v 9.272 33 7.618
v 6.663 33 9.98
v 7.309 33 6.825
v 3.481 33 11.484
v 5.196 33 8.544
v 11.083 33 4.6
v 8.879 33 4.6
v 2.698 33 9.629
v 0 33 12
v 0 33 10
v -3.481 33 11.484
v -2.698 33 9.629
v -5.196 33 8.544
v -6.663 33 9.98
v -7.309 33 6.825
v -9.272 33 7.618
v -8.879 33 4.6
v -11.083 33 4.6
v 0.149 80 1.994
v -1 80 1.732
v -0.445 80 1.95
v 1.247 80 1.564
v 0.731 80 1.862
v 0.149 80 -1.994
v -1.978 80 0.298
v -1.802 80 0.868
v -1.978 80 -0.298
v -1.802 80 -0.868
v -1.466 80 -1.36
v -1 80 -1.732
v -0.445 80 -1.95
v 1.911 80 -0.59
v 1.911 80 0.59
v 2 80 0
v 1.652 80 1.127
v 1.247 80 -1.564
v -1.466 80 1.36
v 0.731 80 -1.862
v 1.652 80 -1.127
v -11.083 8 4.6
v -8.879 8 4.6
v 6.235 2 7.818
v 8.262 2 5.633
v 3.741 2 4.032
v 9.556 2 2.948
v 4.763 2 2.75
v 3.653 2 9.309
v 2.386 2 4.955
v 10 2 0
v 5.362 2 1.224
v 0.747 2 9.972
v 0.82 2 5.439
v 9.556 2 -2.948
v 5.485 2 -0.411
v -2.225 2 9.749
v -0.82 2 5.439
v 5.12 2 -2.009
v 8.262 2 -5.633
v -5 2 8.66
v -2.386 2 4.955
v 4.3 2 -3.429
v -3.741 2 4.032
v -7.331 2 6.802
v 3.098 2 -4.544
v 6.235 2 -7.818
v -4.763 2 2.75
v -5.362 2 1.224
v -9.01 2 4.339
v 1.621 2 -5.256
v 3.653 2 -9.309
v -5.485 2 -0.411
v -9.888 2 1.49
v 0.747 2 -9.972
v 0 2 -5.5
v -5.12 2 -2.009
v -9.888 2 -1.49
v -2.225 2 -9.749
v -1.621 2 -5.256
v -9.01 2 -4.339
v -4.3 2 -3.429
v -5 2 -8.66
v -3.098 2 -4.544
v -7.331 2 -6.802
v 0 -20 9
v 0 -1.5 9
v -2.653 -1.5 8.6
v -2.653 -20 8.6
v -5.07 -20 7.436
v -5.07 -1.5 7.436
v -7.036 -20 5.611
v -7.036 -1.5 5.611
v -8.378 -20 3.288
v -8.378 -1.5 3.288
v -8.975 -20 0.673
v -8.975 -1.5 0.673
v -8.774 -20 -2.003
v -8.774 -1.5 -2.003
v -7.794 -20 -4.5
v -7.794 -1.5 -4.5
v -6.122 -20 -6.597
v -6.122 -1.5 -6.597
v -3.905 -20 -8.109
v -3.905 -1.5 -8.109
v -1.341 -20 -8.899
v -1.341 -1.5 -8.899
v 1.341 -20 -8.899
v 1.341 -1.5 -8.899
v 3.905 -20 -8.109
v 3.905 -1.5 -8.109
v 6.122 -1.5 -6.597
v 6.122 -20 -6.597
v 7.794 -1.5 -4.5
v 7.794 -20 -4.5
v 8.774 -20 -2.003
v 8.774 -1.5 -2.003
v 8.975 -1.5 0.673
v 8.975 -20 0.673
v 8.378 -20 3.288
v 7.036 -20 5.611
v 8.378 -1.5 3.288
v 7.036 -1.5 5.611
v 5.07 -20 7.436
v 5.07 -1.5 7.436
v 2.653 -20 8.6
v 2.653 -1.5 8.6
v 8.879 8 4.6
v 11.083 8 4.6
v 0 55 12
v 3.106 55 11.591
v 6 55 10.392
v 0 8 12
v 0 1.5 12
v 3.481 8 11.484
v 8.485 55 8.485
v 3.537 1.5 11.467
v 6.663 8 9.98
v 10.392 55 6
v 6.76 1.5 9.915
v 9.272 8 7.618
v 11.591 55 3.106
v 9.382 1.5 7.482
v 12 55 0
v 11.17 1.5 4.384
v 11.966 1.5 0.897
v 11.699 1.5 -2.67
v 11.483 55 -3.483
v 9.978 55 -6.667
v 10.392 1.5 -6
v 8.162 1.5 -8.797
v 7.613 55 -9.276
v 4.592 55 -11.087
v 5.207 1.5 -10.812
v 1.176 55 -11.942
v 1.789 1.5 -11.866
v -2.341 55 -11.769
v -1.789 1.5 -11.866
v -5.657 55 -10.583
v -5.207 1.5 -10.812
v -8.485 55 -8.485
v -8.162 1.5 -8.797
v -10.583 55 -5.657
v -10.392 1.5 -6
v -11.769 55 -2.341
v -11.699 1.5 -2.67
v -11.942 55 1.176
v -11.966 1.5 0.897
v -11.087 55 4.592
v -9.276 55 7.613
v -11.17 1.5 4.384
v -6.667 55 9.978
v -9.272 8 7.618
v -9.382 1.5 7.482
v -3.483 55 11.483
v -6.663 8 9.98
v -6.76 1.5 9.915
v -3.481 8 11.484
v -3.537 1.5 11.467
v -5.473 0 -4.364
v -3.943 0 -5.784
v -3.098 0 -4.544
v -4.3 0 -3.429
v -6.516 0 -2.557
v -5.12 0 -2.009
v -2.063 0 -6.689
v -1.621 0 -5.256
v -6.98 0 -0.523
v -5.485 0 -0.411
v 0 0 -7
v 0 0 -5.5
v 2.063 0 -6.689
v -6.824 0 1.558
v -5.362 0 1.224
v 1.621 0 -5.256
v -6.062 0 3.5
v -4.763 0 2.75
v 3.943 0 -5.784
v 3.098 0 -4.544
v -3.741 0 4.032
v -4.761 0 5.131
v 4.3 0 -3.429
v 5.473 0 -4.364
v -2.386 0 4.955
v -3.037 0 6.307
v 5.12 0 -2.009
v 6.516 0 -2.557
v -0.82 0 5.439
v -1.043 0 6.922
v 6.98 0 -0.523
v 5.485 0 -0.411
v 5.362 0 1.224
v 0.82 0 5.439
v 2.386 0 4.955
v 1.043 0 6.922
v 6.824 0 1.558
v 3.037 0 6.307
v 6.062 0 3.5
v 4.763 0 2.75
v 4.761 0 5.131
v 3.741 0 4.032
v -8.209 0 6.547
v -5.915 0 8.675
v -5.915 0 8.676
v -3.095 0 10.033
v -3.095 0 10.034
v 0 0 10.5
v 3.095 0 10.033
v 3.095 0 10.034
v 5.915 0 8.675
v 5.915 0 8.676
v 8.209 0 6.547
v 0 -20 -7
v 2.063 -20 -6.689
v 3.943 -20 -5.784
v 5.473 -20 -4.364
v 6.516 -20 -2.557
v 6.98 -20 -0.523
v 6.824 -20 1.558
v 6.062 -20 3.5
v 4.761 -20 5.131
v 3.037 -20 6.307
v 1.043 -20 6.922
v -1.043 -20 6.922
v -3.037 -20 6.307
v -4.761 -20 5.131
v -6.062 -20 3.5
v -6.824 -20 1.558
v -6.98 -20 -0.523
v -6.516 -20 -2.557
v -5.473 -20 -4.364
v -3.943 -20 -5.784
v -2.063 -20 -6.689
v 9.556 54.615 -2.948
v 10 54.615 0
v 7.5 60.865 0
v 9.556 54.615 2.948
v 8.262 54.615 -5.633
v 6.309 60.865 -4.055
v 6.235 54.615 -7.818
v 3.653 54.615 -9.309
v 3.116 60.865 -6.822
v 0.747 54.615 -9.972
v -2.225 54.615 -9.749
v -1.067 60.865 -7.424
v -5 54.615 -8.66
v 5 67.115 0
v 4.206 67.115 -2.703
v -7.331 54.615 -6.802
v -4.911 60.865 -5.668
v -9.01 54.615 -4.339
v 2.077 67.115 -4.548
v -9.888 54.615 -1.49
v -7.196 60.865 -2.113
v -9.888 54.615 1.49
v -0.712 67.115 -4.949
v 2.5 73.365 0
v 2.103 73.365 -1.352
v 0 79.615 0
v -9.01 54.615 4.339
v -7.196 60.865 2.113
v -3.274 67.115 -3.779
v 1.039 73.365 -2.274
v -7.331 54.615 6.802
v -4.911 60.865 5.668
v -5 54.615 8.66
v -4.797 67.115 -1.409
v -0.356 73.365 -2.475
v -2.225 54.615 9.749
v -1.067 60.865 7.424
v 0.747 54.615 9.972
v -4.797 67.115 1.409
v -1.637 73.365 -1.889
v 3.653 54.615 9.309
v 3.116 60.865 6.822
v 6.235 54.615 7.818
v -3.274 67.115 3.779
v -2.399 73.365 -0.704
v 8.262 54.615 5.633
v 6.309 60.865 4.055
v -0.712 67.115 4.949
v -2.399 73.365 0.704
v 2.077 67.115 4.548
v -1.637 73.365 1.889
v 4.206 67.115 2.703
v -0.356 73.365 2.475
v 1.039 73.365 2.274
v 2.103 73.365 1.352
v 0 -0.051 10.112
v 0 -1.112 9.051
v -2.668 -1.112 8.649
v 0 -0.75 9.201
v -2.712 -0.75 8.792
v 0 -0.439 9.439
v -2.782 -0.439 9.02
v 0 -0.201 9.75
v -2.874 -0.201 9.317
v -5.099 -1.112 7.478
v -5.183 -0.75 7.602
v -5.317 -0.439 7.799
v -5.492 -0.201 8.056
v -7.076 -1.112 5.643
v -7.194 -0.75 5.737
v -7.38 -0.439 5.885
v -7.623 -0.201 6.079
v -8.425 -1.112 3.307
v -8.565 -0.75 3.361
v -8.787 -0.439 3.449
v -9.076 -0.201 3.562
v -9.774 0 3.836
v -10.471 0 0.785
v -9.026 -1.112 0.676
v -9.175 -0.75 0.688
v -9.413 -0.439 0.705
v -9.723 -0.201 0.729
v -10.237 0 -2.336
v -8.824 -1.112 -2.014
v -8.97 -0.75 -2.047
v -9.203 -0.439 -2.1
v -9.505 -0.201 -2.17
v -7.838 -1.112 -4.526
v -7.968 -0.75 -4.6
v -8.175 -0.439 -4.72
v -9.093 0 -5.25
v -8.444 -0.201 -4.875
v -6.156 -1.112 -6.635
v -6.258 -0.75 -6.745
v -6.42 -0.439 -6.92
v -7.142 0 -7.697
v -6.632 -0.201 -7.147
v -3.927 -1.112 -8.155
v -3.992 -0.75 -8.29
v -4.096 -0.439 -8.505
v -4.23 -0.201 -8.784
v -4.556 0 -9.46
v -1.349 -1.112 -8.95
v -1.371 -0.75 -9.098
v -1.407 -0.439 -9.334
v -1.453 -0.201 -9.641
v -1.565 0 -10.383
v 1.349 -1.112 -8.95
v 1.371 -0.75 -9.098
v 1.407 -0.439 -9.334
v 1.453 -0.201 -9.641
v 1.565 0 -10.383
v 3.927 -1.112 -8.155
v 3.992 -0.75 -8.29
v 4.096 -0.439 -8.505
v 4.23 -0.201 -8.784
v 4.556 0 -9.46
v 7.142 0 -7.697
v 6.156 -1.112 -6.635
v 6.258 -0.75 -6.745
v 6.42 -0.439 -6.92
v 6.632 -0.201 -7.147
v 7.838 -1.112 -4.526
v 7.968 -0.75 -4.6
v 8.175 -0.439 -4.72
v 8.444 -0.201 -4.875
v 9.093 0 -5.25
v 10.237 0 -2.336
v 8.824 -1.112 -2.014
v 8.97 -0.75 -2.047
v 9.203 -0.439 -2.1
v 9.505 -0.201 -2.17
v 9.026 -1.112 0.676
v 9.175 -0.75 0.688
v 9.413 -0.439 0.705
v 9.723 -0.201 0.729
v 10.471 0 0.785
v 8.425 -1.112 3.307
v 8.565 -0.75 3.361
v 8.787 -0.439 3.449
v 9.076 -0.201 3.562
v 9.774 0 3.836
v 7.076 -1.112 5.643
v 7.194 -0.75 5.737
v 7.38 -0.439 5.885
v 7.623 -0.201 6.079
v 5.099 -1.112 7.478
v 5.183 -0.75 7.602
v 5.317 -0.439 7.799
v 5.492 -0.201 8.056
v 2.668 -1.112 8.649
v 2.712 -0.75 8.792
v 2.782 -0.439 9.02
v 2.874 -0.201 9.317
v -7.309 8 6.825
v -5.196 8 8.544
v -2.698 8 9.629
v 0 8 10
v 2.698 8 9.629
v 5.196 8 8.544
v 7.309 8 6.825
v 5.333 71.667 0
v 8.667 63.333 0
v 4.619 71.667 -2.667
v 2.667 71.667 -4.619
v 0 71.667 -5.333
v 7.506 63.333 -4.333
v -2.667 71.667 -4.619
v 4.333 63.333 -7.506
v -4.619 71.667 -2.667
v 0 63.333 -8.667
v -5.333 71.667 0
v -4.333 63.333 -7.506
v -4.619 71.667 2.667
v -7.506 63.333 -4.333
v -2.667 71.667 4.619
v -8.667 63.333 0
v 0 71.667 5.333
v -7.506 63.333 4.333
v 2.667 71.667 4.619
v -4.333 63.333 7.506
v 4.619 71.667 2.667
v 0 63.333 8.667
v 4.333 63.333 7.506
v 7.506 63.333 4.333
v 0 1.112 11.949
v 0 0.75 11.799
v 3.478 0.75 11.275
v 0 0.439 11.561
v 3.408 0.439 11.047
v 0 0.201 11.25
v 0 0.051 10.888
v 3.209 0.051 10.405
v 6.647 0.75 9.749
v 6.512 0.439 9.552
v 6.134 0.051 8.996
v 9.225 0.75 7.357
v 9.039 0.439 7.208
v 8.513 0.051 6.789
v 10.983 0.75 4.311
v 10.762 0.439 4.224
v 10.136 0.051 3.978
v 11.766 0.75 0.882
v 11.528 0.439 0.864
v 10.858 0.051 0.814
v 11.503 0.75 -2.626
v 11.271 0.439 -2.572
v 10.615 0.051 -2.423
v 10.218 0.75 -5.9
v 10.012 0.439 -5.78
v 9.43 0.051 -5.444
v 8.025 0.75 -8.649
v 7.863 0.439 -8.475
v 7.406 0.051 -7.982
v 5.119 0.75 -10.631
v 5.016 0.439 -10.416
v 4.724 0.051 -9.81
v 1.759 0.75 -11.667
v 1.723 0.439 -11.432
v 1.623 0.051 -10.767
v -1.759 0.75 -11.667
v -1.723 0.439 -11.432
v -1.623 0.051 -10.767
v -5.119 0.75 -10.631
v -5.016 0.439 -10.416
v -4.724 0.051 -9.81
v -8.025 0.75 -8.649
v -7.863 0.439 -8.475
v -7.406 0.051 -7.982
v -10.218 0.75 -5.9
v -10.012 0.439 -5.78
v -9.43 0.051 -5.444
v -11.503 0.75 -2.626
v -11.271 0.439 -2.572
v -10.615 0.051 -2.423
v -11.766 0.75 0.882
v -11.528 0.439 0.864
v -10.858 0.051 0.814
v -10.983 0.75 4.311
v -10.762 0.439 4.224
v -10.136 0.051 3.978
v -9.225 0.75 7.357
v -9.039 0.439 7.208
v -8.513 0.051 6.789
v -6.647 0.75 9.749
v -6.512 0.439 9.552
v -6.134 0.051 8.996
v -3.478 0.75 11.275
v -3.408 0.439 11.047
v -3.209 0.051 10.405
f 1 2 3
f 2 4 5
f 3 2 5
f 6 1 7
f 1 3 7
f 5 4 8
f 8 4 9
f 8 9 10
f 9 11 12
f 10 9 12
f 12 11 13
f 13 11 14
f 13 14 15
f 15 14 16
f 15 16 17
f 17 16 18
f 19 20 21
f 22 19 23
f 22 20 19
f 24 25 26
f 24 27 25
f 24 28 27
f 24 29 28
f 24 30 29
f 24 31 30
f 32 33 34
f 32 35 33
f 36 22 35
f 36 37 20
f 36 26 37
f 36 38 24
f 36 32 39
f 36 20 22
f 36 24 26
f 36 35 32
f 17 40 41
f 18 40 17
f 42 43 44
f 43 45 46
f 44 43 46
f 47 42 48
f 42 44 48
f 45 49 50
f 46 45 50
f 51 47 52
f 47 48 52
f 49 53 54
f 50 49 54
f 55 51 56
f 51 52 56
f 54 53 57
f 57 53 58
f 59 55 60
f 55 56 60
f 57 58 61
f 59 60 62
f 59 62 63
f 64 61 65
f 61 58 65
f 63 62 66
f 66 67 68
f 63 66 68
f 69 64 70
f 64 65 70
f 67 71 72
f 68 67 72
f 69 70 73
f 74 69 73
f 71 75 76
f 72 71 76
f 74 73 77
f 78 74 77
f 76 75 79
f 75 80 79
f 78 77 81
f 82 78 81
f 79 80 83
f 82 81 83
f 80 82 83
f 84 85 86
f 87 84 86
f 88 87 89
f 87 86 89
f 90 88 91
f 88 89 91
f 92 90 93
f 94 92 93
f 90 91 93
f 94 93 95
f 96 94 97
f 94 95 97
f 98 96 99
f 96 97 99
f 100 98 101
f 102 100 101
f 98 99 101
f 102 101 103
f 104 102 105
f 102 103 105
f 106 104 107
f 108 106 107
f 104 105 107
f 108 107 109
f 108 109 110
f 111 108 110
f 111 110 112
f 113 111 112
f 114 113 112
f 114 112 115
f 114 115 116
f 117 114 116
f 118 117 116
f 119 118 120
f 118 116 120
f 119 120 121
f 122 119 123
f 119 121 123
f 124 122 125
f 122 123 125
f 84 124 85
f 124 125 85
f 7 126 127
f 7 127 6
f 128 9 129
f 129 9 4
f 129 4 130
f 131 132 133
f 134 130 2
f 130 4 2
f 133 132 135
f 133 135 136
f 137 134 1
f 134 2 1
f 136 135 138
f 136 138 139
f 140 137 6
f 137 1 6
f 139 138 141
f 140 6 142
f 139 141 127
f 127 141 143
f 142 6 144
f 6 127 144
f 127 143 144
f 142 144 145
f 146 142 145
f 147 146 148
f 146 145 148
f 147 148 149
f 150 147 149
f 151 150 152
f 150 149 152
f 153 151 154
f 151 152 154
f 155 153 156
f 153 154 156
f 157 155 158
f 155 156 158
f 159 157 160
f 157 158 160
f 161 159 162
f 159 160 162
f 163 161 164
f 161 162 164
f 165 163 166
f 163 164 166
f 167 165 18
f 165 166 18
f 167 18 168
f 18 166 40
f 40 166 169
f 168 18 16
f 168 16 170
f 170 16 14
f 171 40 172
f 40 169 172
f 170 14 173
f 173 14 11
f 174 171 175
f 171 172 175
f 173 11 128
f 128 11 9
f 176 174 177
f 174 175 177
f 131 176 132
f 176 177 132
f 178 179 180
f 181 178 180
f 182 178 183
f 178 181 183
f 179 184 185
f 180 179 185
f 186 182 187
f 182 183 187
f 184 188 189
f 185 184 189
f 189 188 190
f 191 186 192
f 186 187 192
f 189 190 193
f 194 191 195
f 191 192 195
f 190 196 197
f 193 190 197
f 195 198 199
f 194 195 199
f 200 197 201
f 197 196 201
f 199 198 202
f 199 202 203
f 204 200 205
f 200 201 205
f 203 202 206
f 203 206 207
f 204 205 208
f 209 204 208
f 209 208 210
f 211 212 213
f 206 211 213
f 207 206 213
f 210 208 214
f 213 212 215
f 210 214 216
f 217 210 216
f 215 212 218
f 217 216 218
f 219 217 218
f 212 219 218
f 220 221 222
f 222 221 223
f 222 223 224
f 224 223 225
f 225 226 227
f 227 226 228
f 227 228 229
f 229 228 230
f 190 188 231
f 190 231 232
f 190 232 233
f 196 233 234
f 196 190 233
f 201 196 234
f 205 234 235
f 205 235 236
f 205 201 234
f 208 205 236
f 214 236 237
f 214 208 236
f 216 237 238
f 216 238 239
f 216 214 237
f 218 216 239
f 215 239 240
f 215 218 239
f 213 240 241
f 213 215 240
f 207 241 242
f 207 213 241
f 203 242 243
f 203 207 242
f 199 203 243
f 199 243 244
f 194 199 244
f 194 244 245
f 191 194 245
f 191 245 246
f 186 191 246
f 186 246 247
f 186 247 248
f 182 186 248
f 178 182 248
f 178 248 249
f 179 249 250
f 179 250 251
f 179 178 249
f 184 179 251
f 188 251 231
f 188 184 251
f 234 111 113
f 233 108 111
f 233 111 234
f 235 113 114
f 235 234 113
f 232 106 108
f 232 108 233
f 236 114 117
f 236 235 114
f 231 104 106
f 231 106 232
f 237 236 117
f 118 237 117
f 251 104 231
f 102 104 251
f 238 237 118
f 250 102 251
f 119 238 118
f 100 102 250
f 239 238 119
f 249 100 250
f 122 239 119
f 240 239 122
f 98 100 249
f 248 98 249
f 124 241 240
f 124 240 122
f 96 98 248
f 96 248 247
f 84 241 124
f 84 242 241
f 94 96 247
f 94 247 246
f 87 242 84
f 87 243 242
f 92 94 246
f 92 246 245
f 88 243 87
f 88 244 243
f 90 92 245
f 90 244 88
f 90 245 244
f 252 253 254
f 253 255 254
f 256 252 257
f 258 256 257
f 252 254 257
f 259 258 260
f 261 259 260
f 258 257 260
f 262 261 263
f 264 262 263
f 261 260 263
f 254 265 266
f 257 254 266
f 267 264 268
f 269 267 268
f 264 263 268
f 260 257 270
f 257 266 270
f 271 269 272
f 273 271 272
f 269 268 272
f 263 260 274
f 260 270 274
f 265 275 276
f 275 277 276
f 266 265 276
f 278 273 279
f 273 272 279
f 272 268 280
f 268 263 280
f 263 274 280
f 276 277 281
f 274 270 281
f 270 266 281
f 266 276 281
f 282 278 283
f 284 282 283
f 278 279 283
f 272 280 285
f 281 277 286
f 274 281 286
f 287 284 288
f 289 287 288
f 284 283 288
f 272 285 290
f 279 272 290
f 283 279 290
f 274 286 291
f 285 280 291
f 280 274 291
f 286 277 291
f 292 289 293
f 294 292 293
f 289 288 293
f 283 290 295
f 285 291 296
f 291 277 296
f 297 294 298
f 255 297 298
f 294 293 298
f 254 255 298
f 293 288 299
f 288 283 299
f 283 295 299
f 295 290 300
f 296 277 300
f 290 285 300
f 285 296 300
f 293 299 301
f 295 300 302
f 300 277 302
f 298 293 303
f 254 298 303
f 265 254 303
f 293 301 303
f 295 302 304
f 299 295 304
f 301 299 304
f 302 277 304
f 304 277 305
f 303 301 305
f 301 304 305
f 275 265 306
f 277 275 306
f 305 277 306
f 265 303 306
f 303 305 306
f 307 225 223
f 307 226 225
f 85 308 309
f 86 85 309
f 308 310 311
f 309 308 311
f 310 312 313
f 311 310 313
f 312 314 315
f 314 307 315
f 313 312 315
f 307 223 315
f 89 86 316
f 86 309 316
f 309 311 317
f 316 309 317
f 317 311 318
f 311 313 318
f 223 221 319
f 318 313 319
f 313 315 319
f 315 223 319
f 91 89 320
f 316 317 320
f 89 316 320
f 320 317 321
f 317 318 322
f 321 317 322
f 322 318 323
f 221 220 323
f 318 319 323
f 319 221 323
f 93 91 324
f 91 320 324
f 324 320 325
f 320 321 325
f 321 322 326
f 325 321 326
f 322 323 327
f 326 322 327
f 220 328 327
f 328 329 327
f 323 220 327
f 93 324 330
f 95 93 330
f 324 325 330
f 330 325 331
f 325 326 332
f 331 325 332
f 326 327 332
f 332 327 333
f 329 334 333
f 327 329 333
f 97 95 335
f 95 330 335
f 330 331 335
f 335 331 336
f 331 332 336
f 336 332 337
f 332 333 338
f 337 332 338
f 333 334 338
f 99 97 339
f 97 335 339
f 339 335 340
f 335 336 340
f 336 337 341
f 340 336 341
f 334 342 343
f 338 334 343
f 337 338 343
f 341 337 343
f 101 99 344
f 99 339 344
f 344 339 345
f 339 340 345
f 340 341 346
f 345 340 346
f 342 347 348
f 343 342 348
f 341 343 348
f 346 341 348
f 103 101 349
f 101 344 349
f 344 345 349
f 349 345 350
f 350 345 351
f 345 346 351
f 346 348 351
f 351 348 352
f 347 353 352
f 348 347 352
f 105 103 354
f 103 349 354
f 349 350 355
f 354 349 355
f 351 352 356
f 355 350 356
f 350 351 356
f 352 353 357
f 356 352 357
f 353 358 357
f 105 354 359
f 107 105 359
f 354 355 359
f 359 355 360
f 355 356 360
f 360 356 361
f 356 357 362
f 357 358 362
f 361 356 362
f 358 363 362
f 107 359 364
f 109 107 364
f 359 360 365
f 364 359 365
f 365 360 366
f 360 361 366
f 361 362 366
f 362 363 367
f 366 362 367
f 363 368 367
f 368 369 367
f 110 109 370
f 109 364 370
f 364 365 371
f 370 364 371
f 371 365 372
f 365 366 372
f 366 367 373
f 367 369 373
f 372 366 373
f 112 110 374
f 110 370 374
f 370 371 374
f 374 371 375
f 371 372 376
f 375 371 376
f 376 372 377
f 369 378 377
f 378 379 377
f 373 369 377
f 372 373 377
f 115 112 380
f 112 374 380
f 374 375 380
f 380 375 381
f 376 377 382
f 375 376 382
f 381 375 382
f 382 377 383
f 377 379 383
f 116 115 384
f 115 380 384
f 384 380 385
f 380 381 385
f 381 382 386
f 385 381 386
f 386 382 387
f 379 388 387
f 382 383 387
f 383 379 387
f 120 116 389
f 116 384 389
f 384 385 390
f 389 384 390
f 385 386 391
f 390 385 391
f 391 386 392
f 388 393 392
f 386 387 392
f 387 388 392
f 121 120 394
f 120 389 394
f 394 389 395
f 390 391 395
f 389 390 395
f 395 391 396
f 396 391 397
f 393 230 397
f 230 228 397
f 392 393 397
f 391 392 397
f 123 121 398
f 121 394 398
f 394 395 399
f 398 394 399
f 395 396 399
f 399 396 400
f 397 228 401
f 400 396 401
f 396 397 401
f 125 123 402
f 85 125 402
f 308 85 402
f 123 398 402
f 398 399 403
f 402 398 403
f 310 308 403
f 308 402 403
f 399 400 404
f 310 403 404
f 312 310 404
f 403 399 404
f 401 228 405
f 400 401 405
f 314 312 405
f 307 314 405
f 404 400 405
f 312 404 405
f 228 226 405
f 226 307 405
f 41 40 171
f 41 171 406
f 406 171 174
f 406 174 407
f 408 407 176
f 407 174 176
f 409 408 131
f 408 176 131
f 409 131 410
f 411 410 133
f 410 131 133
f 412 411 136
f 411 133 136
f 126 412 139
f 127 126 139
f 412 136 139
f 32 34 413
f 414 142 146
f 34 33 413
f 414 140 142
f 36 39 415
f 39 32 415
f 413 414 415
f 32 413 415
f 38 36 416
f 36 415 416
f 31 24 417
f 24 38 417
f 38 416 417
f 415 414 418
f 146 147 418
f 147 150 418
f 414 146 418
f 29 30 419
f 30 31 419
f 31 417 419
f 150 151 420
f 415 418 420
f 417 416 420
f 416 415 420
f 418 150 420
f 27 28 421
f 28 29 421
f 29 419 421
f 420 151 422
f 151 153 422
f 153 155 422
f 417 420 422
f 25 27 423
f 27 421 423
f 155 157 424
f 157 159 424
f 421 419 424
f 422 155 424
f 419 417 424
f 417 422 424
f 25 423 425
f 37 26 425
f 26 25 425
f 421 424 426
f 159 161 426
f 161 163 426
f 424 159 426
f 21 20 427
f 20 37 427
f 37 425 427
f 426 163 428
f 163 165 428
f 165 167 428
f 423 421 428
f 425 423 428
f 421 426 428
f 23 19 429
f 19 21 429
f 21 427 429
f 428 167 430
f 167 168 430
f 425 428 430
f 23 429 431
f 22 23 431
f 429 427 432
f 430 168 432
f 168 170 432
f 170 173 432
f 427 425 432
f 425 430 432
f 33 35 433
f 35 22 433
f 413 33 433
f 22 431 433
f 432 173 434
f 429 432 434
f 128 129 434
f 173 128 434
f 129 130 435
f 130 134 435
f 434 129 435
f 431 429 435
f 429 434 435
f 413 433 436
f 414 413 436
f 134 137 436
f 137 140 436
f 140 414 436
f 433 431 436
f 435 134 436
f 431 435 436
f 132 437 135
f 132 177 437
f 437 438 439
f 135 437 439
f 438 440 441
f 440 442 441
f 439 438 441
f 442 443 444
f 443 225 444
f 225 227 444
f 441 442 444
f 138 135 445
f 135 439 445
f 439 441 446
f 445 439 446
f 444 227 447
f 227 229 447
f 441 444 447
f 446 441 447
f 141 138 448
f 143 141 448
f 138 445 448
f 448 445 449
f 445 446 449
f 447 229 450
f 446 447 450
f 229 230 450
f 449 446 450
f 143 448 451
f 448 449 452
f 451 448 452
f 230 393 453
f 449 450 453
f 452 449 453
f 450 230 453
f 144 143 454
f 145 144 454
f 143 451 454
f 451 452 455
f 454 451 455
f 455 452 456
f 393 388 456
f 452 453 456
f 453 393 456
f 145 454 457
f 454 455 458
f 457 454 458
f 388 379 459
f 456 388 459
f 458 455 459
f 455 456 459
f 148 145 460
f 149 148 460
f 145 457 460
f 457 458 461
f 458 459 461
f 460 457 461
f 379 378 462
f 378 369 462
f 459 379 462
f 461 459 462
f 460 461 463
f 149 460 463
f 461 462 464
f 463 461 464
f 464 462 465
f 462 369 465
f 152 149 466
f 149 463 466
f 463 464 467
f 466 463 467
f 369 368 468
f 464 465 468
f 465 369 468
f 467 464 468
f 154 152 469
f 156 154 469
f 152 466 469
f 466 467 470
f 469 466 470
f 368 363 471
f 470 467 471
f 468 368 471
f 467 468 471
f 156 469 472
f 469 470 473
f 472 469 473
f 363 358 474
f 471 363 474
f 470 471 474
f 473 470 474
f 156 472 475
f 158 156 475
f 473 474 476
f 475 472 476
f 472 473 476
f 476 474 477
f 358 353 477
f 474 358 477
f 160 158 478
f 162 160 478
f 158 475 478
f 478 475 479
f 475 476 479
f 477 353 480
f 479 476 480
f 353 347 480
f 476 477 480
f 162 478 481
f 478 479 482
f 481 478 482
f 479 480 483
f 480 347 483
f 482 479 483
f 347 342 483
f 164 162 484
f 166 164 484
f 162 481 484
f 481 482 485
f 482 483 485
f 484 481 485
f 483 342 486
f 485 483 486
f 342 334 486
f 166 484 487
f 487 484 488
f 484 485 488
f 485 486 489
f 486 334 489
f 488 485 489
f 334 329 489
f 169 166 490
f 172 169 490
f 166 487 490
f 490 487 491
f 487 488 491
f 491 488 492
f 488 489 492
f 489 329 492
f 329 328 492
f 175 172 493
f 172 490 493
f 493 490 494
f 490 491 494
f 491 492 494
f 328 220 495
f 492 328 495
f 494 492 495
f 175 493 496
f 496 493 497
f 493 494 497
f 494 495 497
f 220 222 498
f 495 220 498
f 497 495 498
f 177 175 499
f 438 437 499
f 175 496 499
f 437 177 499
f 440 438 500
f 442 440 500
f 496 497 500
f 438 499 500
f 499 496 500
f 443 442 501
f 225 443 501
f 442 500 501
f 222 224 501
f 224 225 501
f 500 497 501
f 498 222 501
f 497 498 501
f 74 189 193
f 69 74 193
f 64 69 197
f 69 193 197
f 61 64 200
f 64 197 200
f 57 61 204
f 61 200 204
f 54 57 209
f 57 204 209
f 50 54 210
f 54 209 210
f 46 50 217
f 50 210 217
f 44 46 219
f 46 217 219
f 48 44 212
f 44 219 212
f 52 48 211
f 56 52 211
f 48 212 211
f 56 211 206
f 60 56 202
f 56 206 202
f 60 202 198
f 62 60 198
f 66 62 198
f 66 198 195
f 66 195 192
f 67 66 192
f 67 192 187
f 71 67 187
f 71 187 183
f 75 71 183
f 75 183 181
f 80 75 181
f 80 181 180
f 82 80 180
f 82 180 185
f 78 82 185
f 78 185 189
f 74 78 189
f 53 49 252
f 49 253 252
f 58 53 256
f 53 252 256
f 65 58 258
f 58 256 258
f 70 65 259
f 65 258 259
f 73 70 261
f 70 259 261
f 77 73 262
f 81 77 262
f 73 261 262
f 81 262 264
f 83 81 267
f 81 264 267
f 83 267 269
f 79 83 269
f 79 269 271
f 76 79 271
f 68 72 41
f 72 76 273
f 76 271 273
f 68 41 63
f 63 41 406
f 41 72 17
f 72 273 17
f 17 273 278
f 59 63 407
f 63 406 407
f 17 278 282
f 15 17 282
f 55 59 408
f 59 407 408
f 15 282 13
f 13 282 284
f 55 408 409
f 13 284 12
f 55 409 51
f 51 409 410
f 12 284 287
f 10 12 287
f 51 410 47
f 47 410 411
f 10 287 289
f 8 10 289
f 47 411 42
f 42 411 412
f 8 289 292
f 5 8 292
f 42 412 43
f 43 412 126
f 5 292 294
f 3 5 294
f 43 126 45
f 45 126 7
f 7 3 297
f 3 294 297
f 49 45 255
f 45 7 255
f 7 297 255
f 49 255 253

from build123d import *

# Parameters (mm, degrees)
SKETCH1_R               = 12
BOSS_EXTRUDE1_DEPTH     = 55
SKETCH2_R               = 2
SKETCH3_R               = 9
SKETCH3_R_2             = 7
BOSS_EXTRUDE2_DEPTH     = 20
SKETCH5_R               = 5.5
CUT_EXTRUDE2_DEPTH      = 4
SKETCH6_W               = 20
SKETCH6_H               = 25
CUT_EXTRUDE3_DEPTH      = 3
CUT_EXTRUDE4_DEPTH      = 85.380092576
CUT_EXTRUDE4_DEPTH_BACK = 85.380092576
SKETCH7_W               = 7.4
SKETCH7_H               = 25
FILLET1_R               = 1.5


# Read off the part's stored shape, not the designer's step: Shell1
with BuildPart() as part:
    # Sketch1 → Boss-Extrude1 (new body)
    with BuildSketch(Plane(origin=(0, 0, 0), x_dir=(1, 0, 0), z_dir=(0, 1, 0))):
        with Locations(Location((0, 0, 0), (0, 0, 270))):
            Circle(SKETCH1_R)
    extrude(amount=BOSS_EXTRUDE1_DEPTH)

    # Sketch2 → section 0 of loft1
    with BuildSketch(Plane(origin=(0, 80, 0), x_dir=(1, 0, 0), z_dir=(0, 1, 0)), mode=Mode.PRIVATE) as loft1_s0:
        Circle(SKETCH2_R)
    # loft up to a face of the part (loft1)
    loft([loft1_s0.sketch, Face(Wire([part.edges().sort_by_distance((8.747623529, 55, -8.214565271))[0]]))])

    # Shell1 outline → Shell1 (revolve, cut)
    with BuildSketch(Plane.XY):
        Polygon((10, 2), (10, 54.614835193), (0, 79.614835193), (0, 2), align=None)
    revolve(axis=Axis((0, 0, 0), (0, 1, 0)), mode=Mode.SUBTRACT)

    # Sketch3 → Boss-Extrude2 (add)
    with BuildSketch(Plane.XZ):
        with Locations(Location((0, 0, 0), (0, 0, 90))):
            Circle(SKETCH3_R)
        with Locations(Location((0, 0, 0), (0, 0, 270))):
            Circle(SKETCH3_R_2, mode=Mode.SUBTRACT)
    extrude(amount=BOSS_EXTRUDE2_DEPTH)

    # Sketch5 → Cut-Extrude2 (cut)
    with BuildSketch(Plane.XZ):
        with Locations(Location((0, 0, 0), (0, 0, 270))):
            Circle(SKETCH5_R)
    extrude(amount=-CUT_EXTRUDE2_DEPTH, mode=Mode.SUBTRACT)

    # Sketch6 → Cut-Extrude3 (cut, symmetric)
    with BuildSketch(Plane.XY.offset(11)):
        with Locations((0, 20.5)):
            Rectangle(SKETCH6_W, SKETCH6_H)
    extrude(amount=CUT_EXTRUDE3_DEPTH, both=True, mode=Mode.SUBTRACT)

    # Sketch7 → Cut-Extrude4 (cut, two sides: drawn at the far end of the back side and taken through both)
    with BuildSketch(Plane(origin=(-12, 0, 0), x_dir=(0, 0, -1), z_dir=(1, 0, 0)).offset(-CUT_EXTRUDE4_DEPTH_BACK)):
        with Locations((-8.3, 20.5)):
            Rectangle(SKETCH7_W, SKETCH7_H)
    extrude(amount=CUT_EXTRUDE4_DEPTH + CUT_EXTRUDE4_DEPTH_BACK, mode=Mode.SUBTRACT)

    # Fillet1
    fillet1_edges = [part.edges().sort_by_distance(p)[0] for p in [
        (0, 0, -9),
        (0, 0, -12),
    ]]
    fillet(fillet1_edges, radius=FILLET1_R - 0.0001)  # a hair under: the kernel refuses the full size


solid = part.part
